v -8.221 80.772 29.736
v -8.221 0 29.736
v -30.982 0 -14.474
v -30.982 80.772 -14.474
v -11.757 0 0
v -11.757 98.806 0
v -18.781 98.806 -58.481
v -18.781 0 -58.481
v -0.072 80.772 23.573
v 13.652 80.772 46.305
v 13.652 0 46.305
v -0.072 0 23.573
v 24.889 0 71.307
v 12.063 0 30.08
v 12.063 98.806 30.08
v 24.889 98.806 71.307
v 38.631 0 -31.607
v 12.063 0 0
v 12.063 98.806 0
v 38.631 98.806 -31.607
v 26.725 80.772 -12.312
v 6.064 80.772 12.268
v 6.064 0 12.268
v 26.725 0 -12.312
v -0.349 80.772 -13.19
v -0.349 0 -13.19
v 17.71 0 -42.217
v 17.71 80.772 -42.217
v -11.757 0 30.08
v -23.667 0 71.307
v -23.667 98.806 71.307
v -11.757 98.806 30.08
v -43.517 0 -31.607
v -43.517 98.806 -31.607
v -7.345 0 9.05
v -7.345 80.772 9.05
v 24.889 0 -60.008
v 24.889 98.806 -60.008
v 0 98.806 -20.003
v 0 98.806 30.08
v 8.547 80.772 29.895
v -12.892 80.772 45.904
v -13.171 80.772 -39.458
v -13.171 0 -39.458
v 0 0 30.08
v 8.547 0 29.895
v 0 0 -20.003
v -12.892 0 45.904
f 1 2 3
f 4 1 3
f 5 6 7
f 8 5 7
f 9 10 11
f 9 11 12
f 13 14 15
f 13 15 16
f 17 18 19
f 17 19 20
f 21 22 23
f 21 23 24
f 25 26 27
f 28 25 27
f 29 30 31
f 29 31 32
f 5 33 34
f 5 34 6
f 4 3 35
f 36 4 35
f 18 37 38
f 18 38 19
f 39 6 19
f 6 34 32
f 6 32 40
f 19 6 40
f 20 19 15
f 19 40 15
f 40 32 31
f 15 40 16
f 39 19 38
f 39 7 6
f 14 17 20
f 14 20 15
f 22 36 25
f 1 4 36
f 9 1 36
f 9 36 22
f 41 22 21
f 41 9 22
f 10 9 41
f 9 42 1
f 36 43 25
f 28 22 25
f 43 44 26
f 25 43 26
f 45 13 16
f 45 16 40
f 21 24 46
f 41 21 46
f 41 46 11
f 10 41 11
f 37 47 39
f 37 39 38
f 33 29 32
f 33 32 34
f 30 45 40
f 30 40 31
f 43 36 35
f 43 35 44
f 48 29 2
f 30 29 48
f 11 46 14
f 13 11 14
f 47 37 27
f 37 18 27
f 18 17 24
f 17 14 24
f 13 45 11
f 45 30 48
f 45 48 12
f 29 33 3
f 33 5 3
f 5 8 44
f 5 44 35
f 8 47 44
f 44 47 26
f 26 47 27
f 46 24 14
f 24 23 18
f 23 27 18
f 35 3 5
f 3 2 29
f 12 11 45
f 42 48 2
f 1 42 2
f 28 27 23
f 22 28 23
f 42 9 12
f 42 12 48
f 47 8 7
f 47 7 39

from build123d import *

# Parameters (mm, degrees)
F1_DEPTH = 98.806
F3_DEPTH = 80.772


with BuildPart() as f1:
    # F0 (on Front) → F1 (new body)
    with BuildSketch(Plane.XZ):
        Polygon((0, -20.002501), (24.888605, -60.007501), (12.062577, 0), (38.630784, -31.607002), (12.062577, 30.080097), (24.888605, 71.306624), (0, 30.080097), (-23.66708, 71.306624), (-11.757195, 30.080097), (-43.516889, -31.607002), (-11.757195, 0), (-18.780975, -58.480591), align=None)
    extrude(amount=-F1_DEPTH)

    # F2 (on face) → F3 (cut)
    with BuildSketch(Plane.XZ):
        Polygon((8.546956, 29.895244), (13.65233, 46.305379), (-0.071587, 23.572508), (-12.891517, 45.904), (-8.220637, 29.735567), (-30.981843, -14.473698), (-7.34452, 9.049982), (-13.170568, -39.45819), (-0.349297, -13.190223), (17.709537, -42.21731), (6.063784, 12.268189), (26.72525, -12.311829), align=None)
    extrude(amount=-F3_DEPTH, mode=Mode.SUBTRACT)


solid = f1.part
